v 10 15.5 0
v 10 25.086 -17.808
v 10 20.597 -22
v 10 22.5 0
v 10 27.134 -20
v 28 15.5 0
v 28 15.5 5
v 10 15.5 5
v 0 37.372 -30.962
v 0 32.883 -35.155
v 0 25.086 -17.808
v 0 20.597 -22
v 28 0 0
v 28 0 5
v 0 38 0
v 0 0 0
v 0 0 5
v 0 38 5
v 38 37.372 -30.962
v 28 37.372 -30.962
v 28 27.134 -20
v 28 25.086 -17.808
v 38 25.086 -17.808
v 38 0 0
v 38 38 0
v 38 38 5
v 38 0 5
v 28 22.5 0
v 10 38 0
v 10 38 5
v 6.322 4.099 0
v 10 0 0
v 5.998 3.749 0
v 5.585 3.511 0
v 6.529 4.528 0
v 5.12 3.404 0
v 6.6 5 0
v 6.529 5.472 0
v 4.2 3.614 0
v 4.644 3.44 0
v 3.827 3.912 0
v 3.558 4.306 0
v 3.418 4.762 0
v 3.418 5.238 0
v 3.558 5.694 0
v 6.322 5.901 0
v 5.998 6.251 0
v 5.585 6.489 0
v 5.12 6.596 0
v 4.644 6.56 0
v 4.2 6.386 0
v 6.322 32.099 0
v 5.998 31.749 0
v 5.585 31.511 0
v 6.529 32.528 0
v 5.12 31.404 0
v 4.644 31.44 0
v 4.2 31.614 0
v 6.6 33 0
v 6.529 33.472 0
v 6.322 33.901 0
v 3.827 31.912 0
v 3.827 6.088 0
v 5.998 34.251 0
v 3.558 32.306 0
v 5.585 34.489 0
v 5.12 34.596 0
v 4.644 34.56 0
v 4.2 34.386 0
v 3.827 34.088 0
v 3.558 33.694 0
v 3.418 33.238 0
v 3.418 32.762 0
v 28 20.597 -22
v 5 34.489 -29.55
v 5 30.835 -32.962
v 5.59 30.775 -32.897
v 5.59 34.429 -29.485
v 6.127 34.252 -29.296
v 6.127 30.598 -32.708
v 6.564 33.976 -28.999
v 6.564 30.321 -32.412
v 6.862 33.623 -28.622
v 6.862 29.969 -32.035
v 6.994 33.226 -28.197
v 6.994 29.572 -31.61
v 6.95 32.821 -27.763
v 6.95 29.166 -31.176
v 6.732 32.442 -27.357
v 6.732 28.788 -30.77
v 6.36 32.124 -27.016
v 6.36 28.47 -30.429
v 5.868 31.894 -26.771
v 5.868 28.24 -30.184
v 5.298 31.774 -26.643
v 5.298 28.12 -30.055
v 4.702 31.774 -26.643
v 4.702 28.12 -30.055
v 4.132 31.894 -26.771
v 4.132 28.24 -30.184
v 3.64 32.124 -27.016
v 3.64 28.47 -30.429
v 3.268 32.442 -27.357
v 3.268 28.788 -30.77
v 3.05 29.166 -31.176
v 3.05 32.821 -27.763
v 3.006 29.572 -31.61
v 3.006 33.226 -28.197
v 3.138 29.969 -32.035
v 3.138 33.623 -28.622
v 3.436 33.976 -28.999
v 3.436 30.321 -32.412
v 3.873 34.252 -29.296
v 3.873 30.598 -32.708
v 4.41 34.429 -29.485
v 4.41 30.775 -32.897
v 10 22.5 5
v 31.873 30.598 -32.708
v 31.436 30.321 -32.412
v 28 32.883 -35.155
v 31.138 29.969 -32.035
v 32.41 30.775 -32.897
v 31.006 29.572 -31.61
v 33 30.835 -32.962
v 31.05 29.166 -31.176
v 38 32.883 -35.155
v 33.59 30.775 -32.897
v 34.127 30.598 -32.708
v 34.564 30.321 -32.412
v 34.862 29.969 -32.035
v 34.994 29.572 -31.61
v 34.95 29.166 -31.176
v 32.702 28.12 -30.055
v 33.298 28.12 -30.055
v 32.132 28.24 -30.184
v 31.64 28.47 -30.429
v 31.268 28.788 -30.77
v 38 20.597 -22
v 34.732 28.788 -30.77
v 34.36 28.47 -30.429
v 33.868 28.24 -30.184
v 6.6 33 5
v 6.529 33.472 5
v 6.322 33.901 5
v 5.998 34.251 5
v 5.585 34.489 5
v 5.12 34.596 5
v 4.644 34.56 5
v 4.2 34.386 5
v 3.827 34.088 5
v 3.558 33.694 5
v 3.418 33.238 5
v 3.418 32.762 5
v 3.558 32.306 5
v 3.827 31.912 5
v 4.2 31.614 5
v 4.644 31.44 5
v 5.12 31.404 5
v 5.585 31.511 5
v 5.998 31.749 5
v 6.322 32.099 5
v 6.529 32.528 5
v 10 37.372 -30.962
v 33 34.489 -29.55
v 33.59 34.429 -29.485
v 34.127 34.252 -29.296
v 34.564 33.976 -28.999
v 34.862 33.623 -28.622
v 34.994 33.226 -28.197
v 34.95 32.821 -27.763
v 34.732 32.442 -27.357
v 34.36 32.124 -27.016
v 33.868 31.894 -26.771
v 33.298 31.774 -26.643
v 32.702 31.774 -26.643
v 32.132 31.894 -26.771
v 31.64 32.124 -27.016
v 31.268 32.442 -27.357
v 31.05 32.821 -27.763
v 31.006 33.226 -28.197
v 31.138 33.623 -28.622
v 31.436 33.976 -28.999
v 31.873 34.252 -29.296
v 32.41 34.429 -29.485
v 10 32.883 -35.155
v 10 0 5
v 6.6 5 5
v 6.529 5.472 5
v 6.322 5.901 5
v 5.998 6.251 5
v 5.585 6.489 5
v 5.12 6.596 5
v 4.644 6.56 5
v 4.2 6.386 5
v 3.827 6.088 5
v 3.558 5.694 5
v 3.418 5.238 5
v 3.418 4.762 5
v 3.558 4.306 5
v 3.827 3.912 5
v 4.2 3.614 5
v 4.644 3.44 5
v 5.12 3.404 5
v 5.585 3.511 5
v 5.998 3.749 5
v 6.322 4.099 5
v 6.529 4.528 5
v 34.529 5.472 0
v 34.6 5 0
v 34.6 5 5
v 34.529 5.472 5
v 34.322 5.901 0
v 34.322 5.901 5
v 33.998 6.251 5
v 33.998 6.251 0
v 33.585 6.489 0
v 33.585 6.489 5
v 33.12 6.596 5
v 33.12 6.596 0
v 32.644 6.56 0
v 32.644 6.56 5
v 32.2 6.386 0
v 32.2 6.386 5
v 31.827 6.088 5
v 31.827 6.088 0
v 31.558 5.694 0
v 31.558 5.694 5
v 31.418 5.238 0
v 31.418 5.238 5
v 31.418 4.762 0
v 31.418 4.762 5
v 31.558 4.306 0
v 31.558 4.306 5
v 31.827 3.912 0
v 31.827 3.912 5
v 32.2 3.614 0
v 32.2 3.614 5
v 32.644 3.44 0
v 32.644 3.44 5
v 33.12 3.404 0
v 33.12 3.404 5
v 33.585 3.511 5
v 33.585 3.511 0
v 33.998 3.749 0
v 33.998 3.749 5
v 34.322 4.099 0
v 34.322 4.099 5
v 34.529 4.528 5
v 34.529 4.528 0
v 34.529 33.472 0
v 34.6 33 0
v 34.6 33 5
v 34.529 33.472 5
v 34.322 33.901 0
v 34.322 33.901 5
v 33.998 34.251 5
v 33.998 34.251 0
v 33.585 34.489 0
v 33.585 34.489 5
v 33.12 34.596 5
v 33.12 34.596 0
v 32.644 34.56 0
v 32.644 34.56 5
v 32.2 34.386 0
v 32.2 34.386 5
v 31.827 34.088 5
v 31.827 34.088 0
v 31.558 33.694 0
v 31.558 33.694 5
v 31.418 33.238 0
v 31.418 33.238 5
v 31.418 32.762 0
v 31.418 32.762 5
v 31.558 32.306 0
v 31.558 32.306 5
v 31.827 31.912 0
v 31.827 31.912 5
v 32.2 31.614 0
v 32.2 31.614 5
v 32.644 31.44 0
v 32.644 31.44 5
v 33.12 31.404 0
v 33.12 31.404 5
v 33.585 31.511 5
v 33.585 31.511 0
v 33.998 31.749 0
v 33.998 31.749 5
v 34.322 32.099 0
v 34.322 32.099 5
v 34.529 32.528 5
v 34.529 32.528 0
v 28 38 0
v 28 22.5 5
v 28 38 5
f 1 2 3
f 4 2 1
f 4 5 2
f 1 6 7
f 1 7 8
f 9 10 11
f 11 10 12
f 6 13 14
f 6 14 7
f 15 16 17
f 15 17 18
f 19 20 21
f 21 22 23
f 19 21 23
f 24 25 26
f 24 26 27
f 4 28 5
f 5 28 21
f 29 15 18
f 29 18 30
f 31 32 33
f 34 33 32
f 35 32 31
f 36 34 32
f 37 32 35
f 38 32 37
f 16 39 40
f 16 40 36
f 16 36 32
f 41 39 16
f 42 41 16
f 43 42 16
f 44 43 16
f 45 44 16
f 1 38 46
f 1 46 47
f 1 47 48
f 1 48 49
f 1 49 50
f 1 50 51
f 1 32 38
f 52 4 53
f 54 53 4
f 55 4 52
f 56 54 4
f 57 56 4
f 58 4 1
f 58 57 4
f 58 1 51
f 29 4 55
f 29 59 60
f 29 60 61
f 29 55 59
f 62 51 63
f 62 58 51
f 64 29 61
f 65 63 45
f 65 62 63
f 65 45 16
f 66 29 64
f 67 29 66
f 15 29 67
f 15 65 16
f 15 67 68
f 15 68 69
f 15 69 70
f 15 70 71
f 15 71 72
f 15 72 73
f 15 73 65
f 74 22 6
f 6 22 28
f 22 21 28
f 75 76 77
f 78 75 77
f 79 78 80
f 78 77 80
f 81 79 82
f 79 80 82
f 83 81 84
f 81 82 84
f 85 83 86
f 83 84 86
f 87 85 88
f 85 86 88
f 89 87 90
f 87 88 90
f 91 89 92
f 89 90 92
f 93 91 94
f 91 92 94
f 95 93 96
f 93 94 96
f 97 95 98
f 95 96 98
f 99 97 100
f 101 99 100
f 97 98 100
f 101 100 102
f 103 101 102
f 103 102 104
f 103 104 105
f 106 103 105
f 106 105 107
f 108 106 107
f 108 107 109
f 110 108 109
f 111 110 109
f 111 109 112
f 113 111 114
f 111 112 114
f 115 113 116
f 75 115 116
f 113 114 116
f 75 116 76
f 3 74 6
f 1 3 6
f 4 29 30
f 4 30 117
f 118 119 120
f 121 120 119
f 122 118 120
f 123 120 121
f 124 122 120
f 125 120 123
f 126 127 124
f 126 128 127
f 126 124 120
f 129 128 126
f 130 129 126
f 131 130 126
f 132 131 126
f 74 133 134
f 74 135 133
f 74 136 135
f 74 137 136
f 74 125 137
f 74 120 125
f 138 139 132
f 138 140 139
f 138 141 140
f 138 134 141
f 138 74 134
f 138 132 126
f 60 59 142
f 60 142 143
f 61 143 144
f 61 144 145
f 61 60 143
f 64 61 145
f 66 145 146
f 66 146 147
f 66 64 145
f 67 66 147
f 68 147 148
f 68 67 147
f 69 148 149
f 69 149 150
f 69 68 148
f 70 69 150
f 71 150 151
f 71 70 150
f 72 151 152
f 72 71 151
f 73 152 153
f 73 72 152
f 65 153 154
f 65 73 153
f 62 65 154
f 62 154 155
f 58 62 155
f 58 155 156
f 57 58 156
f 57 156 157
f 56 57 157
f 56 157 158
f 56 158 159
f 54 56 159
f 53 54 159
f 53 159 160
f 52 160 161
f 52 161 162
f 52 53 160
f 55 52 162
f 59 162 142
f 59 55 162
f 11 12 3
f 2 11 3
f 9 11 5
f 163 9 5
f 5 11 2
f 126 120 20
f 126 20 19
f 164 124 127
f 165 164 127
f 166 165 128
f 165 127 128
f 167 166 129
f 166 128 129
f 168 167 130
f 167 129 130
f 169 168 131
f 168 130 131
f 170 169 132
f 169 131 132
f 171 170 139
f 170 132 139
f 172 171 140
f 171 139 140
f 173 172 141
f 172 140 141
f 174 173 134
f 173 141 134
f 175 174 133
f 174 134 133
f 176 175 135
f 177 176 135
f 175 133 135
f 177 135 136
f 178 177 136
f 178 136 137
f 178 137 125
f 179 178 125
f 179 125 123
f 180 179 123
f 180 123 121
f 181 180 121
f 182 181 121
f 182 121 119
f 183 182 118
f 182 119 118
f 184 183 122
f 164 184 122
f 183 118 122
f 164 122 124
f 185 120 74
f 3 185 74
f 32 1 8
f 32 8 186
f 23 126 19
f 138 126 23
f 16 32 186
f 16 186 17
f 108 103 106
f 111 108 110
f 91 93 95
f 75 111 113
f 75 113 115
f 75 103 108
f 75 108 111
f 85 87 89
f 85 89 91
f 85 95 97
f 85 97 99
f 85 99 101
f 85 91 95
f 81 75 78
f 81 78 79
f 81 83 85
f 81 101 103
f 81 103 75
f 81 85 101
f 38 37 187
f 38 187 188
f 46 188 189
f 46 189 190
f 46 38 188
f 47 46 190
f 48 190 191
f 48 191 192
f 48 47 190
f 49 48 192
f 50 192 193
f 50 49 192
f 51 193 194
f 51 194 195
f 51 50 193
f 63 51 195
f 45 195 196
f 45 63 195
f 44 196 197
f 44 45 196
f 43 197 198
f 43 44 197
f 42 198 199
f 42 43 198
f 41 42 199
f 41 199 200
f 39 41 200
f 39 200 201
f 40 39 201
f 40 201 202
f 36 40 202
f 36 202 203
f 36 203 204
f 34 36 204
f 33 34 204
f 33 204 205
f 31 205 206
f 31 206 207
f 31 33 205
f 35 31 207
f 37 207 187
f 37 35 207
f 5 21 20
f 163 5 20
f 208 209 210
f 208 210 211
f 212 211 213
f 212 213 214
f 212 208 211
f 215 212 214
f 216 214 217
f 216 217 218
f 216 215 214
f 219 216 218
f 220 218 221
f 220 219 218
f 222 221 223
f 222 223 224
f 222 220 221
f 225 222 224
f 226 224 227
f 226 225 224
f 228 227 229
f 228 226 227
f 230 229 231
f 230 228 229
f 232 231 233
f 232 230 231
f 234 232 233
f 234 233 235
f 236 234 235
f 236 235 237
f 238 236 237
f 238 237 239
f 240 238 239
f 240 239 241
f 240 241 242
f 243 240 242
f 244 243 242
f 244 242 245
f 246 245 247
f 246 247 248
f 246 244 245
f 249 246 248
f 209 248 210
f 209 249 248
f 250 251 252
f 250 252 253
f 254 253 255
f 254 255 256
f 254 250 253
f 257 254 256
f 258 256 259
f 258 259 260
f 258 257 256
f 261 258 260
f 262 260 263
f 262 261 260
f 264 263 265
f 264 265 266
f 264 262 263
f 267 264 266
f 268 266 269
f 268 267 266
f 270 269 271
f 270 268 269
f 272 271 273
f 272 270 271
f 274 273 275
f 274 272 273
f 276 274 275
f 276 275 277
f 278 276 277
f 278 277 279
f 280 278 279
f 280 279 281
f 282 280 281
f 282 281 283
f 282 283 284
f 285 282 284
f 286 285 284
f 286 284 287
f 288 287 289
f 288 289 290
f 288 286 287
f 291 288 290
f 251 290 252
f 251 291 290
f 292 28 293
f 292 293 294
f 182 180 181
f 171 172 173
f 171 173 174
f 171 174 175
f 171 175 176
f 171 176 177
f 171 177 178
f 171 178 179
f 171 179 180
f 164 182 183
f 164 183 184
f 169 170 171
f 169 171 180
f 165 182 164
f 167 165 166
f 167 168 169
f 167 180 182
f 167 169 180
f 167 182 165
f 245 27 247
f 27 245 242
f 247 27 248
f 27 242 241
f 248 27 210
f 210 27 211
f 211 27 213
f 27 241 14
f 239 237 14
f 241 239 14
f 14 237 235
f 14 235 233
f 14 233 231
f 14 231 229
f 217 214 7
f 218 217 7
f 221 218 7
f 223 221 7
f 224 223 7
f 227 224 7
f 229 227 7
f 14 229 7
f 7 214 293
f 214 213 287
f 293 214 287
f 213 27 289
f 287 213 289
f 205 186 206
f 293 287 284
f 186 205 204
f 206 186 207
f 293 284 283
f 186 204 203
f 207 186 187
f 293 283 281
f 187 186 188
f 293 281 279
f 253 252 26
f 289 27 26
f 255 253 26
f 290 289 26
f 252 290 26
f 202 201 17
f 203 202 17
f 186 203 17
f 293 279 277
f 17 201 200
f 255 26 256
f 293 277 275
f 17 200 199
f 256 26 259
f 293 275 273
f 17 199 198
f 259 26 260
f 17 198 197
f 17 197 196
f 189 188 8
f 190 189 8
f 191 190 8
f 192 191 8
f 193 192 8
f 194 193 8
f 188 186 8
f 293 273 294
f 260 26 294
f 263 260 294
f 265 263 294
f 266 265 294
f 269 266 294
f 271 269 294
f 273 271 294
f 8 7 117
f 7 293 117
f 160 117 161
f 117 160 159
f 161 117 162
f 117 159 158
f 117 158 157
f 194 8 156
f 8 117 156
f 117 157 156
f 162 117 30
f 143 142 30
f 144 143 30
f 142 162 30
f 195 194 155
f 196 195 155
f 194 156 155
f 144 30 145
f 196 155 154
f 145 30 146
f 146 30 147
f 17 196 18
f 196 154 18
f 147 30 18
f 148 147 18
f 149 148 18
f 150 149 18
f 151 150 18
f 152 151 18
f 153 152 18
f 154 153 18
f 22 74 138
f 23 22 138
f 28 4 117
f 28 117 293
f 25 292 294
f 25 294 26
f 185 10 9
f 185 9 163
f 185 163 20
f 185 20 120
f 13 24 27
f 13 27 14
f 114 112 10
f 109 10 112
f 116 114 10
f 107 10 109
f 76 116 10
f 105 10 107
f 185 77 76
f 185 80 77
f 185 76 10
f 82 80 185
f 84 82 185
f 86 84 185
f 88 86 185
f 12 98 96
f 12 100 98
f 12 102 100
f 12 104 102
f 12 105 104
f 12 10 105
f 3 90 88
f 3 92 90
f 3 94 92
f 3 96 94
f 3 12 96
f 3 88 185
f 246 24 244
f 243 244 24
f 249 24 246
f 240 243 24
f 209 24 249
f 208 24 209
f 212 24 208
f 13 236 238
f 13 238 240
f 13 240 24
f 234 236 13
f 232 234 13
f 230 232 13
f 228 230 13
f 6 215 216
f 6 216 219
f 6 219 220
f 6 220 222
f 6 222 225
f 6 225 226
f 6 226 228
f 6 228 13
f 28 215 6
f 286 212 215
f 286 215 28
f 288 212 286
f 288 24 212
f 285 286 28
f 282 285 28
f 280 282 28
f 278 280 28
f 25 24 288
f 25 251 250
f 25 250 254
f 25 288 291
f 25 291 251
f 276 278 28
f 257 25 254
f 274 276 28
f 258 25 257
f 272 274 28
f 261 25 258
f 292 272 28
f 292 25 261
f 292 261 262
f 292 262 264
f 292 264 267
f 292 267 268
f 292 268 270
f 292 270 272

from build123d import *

# Parameters (mm, degrees)
SKETCH_1_R          = 1.6
EXTRUDE_1_DEPTH     = 5
EXTRUDE_START       = -10
EXTRUDE_2_DEPTH     = 18
SKETCH_4_W          = 10
SKETCH_4_H          = 18
EXTRUDE_3_DEPTH     = 6.14228691
SKETCH_5_R          = 2
CUT_EXTRUDE_1_DEPTH = 5


with BuildPart() as part:
    # 草图1 → 凸台-拉伸1 (new body)
    with BuildSketch(Plane.XY):
        Polygon((0, 0), (0, 38), (10, 38), (10, 22.5), (28, 22.5), (28, 38), (38, 38), (38, 0), (28, 0), (28, 15.5), (10, 15.5), (10, 0), align=None)
        with Locations((5, 33)):
            Circle(SKETCH_1_R, mode=Mode.SUBTRACT)
        with Locations((33, 33)):
            Circle(SKETCH_1_R, mode=Mode.SUBTRACT)
        with Locations((33, 5)):
            Circle(SKETCH_1_R, mode=Mode.SUBTRACT)
        with Locations((5, 5)):
            Circle(SKETCH_1_R, mode=Mode.SUBTRACT)
    extrude(amount=EXTRUDE_1_DEPTH)

    # 草图2 → 凸台-拉伸2 (add)
    with BuildSketch(Plane(origin=(38, 0, 0), x_dir=(0, 0, -1), z_dir=(1, 0, 0)).offset(EXTRUDE_START)):
        Polygon((0, 22.5), (20, 27.133580113), (30.962428796, 37.371995756), (35.154914556, 32.883036896), (22, 20.596938124), (0, 15.5), align=None)
    extrude(amount=-EXTRUDE_2_DEPTH)

    # 草图4 → 凸台-拉伸3 (add)
    with BuildSketch(Plane(origin=(0, 0.026666642, 0.024905444), x_dir=(1, 0, 0), z_dir=(0, -0.7308285864179805, -0.682561042892353))):
        with Locations((5, -39.136896468)):
            Rectangle(SKETCH_4_W, SKETCH_4_H)
        with Locations((33, -39.136896468)):
            Rectangle(SKETCH_4_W, SKETCH_4_H)
    extrude(amount=-EXTRUDE_3_DEPTH)

    # 草图5 → 切除-拉伸1 (cut)
    with BuildSketch(Plane(origin=(0, 0.026666642, 0.024905444), x_dir=(1, 0, 0), z_dir=(0, -0.7308285864179805, -0.682561042892353))):
        with Locations(Location((5, -43.136896468, 0), (0, 0, 270))):
            Circle(SKETCH_5_R)
        with Locations(Location((33, -43.136896468, 0), (0, 0, 270))):
            Circle(SKETCH_5_R)
    extrude(amount=-CUT_EXTRUDE_1_DEPTH, mode=Mode.SUBTRACT)


solid = part.part
